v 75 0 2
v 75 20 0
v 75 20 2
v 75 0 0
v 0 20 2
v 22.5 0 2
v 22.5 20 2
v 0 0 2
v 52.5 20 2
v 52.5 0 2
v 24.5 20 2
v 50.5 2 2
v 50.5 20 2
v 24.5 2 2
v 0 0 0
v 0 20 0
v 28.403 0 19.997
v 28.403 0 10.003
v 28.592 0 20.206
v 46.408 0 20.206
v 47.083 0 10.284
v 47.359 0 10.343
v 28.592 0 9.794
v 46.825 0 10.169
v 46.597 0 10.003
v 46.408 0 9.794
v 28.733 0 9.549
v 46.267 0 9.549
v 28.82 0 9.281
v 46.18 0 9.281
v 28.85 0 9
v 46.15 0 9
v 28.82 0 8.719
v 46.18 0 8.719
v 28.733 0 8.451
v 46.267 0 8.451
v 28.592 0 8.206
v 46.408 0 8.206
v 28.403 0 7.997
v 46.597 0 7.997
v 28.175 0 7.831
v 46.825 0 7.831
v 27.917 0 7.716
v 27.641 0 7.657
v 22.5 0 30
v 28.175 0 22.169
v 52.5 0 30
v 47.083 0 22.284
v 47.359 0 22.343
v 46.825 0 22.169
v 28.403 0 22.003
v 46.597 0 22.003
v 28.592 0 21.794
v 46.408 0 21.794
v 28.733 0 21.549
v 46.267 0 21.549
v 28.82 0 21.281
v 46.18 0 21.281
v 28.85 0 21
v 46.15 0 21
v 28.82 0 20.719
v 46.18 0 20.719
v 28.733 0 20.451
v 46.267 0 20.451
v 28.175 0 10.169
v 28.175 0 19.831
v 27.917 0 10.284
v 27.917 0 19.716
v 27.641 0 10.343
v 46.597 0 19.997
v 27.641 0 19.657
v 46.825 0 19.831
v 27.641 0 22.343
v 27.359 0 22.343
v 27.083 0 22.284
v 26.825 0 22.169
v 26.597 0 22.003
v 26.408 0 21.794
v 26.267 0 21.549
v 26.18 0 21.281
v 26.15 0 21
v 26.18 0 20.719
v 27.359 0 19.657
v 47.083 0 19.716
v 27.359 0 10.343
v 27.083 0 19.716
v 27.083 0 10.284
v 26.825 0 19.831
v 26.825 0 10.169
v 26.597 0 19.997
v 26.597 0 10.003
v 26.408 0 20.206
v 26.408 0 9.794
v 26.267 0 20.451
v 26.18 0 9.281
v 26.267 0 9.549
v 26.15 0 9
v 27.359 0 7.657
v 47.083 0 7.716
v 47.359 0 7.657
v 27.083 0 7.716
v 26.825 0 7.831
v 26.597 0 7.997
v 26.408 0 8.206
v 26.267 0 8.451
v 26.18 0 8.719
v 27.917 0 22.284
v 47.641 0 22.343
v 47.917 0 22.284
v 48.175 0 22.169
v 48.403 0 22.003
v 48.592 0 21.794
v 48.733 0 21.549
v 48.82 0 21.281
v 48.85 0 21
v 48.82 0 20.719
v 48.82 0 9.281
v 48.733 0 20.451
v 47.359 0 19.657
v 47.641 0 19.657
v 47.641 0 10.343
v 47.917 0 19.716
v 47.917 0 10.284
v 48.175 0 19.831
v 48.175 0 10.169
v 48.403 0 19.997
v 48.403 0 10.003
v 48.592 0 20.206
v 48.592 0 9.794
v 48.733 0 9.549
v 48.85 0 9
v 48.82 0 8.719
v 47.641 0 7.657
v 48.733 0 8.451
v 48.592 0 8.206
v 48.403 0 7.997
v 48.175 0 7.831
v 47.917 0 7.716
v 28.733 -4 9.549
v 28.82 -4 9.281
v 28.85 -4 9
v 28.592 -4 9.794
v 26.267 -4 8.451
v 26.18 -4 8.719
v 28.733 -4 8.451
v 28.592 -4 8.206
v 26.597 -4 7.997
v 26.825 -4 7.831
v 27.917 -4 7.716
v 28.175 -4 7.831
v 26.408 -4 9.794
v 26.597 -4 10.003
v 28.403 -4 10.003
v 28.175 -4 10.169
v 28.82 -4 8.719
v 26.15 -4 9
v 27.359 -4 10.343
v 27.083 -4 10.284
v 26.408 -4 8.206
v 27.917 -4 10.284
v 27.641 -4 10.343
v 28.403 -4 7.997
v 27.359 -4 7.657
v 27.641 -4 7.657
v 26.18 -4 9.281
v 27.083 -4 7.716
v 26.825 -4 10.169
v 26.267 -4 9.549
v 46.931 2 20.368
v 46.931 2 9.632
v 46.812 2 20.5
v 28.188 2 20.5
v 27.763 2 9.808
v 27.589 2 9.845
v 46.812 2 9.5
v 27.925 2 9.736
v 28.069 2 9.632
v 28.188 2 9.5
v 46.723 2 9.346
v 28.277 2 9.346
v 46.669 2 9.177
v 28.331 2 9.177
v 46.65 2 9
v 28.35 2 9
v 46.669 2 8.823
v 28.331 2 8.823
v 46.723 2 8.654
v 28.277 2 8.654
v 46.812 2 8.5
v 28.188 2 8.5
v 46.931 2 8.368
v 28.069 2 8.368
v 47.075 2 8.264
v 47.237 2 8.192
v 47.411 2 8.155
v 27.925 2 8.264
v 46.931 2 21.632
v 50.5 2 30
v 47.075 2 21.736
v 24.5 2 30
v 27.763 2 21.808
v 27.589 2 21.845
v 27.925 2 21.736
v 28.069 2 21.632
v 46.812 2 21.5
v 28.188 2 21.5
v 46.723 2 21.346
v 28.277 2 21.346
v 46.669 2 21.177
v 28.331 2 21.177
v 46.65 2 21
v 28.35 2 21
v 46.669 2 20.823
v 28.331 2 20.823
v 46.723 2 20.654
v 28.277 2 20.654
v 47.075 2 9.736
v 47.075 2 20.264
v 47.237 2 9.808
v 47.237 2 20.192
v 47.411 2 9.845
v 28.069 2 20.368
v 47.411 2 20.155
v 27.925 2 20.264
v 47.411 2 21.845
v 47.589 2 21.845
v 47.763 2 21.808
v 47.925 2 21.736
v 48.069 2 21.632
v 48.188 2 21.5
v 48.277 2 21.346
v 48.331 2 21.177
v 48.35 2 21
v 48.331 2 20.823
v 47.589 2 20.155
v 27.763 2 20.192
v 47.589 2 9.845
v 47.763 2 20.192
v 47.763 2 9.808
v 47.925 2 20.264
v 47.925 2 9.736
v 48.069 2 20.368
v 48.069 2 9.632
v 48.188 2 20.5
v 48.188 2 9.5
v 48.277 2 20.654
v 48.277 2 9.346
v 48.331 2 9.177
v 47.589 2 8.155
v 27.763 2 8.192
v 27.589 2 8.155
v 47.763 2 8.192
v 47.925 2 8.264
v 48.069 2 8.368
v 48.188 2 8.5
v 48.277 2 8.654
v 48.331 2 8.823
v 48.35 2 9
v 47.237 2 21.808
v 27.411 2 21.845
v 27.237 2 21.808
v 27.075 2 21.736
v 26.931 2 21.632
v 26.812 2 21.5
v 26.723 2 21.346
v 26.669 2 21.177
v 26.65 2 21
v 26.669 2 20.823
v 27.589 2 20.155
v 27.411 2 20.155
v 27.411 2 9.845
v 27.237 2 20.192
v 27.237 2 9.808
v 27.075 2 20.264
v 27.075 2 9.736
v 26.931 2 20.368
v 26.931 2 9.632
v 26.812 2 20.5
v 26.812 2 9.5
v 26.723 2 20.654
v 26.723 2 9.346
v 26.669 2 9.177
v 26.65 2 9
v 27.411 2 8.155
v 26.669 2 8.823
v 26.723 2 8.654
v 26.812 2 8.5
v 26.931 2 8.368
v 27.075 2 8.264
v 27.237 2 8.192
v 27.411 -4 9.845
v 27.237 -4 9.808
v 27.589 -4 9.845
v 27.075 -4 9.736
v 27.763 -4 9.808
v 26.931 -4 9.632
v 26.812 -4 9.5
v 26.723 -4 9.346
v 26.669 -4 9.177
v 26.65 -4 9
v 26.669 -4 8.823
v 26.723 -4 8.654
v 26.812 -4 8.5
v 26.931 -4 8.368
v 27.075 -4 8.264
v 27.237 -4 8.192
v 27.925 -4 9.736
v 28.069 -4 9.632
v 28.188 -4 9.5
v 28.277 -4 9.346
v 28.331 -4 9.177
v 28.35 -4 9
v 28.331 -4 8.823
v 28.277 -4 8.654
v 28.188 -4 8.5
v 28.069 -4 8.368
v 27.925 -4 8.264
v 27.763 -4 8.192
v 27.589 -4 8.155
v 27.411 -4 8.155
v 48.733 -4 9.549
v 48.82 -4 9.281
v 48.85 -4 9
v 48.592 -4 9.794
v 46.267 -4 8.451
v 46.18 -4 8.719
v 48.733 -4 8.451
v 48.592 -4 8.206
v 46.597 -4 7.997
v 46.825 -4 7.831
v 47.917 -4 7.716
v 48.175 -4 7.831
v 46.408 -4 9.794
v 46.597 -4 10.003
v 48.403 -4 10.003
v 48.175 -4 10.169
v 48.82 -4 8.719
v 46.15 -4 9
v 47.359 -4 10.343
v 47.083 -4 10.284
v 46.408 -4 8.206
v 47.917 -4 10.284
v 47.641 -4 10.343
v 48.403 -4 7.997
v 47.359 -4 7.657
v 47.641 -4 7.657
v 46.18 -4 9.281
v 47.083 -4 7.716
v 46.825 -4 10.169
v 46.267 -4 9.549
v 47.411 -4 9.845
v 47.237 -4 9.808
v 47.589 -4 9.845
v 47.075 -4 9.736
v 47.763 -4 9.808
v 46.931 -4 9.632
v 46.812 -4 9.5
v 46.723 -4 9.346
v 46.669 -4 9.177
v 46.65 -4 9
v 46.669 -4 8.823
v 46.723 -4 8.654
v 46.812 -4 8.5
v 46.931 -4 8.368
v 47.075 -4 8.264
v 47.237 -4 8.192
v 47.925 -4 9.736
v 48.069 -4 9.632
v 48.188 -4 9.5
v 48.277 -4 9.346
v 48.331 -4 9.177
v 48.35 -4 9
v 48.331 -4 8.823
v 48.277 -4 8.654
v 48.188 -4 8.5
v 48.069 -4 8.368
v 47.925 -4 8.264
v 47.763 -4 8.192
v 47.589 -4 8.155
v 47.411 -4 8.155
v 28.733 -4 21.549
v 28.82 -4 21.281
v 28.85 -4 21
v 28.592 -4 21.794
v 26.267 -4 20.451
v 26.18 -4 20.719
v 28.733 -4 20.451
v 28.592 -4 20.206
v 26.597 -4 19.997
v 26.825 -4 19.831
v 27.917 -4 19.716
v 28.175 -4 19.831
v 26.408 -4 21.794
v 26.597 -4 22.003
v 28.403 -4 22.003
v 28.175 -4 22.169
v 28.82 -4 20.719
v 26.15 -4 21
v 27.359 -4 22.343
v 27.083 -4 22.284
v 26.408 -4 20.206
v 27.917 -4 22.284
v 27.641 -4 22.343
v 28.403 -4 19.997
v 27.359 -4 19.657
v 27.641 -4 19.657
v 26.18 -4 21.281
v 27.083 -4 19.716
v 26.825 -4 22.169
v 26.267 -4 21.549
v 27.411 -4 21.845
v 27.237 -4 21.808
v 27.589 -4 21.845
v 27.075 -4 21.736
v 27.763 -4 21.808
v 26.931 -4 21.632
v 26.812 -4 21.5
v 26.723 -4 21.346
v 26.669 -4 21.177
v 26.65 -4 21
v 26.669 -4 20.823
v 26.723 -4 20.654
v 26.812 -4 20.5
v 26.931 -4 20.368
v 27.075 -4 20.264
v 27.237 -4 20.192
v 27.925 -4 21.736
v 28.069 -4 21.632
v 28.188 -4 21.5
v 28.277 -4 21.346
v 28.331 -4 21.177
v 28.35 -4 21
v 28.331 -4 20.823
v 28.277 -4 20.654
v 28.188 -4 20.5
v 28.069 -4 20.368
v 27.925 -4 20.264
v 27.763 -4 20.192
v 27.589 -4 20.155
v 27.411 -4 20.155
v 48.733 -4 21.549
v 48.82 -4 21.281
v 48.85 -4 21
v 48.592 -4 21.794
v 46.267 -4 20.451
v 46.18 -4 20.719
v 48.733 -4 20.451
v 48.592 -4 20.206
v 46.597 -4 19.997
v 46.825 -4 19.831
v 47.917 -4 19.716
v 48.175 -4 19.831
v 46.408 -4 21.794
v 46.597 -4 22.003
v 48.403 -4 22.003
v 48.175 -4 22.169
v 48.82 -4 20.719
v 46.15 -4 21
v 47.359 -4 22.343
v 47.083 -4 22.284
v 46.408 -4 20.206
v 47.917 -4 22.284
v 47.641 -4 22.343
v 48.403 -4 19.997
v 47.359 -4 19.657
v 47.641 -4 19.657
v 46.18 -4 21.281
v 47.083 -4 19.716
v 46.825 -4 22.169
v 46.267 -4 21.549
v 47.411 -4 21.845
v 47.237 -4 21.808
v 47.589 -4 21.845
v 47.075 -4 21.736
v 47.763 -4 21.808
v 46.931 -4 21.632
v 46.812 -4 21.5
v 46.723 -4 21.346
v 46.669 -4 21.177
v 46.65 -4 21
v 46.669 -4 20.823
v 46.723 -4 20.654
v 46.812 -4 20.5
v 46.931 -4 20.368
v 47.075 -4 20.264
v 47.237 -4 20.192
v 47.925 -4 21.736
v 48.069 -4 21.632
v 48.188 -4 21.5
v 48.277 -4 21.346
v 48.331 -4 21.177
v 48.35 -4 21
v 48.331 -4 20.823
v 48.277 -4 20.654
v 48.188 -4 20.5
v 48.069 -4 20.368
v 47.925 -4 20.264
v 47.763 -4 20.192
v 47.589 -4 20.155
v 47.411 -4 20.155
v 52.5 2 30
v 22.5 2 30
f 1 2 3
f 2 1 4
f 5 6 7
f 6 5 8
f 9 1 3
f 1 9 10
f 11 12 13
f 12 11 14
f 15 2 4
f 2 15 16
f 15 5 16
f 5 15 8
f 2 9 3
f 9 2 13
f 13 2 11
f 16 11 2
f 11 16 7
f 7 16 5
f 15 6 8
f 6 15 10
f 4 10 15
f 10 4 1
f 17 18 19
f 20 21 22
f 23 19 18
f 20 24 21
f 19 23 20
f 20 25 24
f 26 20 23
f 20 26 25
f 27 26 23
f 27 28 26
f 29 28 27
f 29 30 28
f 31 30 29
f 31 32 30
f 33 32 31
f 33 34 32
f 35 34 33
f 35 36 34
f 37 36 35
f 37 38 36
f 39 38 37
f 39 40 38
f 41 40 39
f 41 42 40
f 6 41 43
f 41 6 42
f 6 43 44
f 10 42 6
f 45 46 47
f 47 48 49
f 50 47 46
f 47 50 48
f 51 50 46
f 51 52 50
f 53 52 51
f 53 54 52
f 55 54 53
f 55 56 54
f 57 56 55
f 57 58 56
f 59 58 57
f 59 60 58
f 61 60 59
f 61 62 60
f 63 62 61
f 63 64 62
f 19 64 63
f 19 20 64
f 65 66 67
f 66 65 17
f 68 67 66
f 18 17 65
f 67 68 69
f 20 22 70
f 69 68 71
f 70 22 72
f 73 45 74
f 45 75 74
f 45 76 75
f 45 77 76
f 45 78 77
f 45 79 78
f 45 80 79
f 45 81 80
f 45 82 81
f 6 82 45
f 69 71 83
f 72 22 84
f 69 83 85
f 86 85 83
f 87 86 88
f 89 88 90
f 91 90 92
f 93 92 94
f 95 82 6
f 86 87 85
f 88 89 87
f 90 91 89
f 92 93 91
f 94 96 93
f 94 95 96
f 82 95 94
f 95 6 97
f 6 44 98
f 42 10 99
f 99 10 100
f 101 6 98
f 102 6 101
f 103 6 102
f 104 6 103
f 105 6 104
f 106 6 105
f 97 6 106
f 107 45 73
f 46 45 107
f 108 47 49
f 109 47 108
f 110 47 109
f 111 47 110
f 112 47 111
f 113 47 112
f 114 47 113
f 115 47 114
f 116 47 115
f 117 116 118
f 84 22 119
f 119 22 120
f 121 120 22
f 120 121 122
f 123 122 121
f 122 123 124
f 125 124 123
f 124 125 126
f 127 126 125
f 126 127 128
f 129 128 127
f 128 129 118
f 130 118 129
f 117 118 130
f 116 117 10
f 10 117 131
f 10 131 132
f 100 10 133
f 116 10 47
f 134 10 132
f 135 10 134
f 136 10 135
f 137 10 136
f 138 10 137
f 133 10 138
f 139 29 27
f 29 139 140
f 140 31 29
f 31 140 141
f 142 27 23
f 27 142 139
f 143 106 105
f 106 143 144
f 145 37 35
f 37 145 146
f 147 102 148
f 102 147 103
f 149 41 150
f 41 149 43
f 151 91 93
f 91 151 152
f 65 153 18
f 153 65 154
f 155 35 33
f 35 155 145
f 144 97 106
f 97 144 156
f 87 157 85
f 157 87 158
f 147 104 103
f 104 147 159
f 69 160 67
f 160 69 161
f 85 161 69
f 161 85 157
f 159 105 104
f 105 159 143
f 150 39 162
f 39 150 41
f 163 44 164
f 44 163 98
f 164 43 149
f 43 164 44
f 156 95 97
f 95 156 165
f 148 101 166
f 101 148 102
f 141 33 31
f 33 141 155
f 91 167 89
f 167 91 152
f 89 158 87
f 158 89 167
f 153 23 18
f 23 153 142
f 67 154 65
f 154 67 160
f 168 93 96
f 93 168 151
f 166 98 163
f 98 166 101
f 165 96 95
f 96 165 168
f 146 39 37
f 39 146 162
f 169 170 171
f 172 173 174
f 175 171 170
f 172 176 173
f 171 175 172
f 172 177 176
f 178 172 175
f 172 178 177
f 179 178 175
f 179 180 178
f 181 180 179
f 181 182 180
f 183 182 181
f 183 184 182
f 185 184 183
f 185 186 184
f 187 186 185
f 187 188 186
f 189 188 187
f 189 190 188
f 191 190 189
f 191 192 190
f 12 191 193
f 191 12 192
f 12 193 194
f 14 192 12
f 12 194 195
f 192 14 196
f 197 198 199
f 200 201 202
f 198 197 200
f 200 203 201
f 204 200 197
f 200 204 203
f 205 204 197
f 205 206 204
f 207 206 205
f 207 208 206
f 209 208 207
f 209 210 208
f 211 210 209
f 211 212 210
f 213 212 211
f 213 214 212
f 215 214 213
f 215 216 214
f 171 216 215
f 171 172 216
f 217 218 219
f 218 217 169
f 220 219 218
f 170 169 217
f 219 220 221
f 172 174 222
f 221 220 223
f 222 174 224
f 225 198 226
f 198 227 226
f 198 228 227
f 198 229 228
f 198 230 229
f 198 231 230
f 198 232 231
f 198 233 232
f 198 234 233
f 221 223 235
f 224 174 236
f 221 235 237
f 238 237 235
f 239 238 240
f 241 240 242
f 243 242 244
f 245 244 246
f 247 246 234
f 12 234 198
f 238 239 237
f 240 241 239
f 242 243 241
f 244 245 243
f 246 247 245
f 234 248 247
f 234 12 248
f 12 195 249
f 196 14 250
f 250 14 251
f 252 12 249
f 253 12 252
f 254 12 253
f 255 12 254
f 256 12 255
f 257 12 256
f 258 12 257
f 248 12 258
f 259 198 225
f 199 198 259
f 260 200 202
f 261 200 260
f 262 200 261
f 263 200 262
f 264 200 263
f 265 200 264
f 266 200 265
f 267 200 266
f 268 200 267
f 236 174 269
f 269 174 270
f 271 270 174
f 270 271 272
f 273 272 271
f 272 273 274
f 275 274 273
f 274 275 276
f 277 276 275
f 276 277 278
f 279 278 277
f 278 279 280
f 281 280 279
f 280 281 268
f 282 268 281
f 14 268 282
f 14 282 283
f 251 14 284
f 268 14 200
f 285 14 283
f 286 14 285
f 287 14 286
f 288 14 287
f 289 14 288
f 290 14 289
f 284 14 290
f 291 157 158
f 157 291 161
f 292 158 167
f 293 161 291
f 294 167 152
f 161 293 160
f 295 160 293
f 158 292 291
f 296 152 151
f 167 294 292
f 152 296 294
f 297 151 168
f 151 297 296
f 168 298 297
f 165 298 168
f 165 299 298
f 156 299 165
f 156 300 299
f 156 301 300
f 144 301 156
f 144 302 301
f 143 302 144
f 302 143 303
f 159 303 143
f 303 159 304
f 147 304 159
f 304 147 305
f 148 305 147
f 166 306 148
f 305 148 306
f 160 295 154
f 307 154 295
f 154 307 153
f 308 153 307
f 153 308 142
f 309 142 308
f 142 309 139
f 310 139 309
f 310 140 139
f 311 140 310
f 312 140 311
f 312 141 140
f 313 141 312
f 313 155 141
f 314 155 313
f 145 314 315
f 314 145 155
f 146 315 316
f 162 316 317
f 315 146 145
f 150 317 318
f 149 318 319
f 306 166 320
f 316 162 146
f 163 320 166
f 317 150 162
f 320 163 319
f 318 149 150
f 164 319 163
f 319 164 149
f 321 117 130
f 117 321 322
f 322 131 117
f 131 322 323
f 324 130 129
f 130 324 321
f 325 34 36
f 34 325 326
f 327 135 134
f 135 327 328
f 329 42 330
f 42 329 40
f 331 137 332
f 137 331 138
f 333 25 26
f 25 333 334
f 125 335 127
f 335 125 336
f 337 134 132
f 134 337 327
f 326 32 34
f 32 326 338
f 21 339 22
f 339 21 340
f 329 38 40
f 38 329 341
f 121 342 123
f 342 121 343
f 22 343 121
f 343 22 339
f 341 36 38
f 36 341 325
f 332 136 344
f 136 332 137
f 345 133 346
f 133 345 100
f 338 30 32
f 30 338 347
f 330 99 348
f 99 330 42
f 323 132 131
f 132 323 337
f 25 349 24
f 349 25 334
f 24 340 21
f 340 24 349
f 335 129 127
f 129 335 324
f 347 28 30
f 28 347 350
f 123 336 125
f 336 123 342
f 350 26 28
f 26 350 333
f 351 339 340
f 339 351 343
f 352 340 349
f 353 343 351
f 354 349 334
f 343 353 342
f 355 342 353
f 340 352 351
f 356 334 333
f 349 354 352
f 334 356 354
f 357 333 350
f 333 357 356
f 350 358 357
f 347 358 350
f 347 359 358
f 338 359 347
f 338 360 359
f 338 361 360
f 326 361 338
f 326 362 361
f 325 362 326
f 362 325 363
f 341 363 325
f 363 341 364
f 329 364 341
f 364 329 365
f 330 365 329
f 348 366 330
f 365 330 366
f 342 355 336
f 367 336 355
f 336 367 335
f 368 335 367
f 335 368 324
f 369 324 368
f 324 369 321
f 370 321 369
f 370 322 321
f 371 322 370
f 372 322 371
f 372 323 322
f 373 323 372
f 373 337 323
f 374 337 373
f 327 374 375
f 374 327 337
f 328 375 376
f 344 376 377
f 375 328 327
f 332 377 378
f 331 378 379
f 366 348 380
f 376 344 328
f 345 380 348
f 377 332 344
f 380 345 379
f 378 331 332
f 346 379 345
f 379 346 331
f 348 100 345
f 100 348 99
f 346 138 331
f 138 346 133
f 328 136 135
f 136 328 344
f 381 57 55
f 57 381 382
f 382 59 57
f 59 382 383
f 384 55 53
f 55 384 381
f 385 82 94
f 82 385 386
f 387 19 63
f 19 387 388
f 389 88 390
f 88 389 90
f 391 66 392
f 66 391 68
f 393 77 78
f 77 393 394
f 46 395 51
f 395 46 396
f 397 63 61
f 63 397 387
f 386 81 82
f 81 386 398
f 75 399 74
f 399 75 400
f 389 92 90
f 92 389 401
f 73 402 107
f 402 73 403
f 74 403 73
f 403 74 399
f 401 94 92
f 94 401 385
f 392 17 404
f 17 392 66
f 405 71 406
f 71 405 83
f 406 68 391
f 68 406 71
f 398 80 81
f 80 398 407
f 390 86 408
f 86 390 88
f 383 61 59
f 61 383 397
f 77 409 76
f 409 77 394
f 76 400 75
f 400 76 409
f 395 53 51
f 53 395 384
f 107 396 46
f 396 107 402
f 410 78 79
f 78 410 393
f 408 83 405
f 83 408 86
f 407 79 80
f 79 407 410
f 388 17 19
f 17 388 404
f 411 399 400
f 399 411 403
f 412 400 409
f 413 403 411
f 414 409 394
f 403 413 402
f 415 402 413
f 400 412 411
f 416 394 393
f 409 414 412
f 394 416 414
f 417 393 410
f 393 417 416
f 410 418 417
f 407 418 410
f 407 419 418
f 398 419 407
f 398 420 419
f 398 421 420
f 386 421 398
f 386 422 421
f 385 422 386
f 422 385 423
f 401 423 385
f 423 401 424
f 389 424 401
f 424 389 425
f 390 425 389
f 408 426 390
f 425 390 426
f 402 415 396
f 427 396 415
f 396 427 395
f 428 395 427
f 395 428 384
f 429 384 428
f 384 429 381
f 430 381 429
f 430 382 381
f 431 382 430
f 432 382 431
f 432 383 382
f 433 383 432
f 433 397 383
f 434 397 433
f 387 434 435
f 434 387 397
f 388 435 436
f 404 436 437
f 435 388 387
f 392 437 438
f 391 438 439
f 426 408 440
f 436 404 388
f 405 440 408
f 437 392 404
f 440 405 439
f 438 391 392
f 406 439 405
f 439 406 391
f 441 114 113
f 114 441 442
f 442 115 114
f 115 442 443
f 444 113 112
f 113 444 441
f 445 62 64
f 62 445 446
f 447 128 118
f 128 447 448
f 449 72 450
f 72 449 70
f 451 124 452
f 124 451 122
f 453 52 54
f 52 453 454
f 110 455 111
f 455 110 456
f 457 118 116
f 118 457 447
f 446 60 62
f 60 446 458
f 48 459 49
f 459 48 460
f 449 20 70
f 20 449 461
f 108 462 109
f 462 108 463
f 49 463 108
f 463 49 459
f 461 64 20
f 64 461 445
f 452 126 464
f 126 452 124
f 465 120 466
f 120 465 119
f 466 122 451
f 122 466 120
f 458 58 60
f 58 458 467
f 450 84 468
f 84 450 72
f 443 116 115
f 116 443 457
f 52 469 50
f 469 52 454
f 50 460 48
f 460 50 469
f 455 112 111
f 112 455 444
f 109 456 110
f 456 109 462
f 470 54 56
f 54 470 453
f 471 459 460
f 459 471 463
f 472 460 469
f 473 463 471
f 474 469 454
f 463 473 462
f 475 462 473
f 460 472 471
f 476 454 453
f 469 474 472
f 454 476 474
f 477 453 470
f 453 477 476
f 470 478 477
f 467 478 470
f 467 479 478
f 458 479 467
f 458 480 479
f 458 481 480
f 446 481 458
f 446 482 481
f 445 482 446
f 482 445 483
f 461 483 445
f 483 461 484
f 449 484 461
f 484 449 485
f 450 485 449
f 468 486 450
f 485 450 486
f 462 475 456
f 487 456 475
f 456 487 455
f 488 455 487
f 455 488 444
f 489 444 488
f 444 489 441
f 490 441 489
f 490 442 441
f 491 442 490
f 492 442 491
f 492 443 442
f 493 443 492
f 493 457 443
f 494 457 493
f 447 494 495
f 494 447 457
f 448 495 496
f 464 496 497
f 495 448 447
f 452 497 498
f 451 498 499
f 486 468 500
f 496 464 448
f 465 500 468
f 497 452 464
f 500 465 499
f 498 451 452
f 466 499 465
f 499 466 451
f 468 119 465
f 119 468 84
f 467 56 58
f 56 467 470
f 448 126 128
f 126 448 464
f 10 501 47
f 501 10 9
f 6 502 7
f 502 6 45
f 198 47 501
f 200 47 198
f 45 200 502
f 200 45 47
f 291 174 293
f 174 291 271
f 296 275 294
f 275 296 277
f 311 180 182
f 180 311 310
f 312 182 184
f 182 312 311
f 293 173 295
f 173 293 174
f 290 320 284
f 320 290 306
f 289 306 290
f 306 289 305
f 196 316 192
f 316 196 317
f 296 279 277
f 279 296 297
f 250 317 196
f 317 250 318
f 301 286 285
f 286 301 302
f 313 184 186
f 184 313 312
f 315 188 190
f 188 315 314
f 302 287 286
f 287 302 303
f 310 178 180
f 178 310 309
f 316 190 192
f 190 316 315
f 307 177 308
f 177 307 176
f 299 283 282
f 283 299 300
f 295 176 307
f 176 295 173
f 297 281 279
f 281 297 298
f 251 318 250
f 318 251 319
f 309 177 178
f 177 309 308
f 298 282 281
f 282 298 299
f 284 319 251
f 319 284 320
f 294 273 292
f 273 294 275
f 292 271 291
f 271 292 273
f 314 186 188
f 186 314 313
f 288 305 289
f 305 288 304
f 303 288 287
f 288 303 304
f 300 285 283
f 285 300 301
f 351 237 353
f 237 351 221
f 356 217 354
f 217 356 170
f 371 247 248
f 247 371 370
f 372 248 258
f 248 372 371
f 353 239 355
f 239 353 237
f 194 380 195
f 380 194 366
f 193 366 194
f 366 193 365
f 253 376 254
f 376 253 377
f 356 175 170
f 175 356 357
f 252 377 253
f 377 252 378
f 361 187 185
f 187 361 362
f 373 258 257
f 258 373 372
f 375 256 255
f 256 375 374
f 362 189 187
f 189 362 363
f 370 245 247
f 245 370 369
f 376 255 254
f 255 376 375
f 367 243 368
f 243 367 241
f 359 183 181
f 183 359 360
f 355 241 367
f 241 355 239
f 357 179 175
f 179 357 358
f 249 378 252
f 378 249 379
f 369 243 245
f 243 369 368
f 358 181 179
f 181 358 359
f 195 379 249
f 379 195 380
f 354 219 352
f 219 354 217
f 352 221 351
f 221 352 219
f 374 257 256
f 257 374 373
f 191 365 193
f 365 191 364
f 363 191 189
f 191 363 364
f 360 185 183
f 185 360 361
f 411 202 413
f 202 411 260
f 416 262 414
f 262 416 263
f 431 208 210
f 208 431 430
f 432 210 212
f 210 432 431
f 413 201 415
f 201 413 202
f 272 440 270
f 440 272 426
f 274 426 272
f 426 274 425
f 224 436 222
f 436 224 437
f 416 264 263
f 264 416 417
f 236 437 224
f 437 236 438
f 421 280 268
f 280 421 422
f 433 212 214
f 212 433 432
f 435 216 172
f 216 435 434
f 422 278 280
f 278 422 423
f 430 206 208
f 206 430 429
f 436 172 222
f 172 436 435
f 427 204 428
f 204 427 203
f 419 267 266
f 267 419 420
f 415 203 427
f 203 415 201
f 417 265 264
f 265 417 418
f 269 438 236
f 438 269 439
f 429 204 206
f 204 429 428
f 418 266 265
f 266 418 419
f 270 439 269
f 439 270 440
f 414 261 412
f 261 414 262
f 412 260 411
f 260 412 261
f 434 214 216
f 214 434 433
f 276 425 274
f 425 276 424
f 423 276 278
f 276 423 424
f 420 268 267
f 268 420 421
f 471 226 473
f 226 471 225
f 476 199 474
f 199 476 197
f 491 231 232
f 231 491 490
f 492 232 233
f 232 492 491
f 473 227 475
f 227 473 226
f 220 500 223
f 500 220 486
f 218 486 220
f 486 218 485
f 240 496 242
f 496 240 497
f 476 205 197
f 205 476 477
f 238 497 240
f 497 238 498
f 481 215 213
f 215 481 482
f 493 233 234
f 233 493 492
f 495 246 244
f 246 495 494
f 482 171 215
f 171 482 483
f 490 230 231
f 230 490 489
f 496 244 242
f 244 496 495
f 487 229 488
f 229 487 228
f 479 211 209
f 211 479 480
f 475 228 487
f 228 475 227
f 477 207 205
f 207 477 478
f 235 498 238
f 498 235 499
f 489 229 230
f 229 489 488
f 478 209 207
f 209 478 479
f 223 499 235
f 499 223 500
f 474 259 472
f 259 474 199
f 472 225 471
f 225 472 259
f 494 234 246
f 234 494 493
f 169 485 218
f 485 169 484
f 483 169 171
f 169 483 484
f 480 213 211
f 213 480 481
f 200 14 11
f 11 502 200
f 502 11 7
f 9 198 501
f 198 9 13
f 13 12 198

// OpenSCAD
// file: slice.scad
$fn = 30;

module slice(width = 75, height = 40, thickness = 2, standoff = 4, lug = 3, holes = []) {
  difference() {
    union() {
      cube([width, height, thickness]);
      for (hole = holes) {
	translate([(width/2)+hole[0], (height/2)+hole[1], 0]) cylinder(r = (hole[2] + lug), h = thickness + standoff, $fn = $fn);
      }
    }
    union() {
      for (hole = holes) {
	translate([(width/2)+hole[0], (height/2)+hole[1], 0]) cylinder(r = hole[2], h = thickness + standoff, $fn = $fn);
      }
    }
  }
}
// main file
include<slice.scad>

$fn = 30;

width = 20;
depth = 12;

fl = [-width / 2, -depth / 2];
fr = [width / 2, -depth / 2];
rl = [-width / 2, depth / 2];
rr = [width / 2, depth / 2];

hole_radius = 1.7 / 2;

slice(height = 20);

translate([37.5 - 30 / 2, 2, 0]) rotate([90, 0, 0]) slice(width = 30, height = 30, lug = 0.5,
								holes = [
								[fl[0],fl[1],hole_radius],
								[fr[0],fr[1],hole_radius],
								[rl[0],rl[1],hole_radius],
								[rr[0],rr[1],hole_radius],
								]);
for (x = [37.5 - 30 / 2, 37.5 - 2 + 30 / 2]) {
	translate([x, 0, 0]) hull() {
		cube([2, 2, 30]);
		cube([2, 20, 2]);
	}
}
